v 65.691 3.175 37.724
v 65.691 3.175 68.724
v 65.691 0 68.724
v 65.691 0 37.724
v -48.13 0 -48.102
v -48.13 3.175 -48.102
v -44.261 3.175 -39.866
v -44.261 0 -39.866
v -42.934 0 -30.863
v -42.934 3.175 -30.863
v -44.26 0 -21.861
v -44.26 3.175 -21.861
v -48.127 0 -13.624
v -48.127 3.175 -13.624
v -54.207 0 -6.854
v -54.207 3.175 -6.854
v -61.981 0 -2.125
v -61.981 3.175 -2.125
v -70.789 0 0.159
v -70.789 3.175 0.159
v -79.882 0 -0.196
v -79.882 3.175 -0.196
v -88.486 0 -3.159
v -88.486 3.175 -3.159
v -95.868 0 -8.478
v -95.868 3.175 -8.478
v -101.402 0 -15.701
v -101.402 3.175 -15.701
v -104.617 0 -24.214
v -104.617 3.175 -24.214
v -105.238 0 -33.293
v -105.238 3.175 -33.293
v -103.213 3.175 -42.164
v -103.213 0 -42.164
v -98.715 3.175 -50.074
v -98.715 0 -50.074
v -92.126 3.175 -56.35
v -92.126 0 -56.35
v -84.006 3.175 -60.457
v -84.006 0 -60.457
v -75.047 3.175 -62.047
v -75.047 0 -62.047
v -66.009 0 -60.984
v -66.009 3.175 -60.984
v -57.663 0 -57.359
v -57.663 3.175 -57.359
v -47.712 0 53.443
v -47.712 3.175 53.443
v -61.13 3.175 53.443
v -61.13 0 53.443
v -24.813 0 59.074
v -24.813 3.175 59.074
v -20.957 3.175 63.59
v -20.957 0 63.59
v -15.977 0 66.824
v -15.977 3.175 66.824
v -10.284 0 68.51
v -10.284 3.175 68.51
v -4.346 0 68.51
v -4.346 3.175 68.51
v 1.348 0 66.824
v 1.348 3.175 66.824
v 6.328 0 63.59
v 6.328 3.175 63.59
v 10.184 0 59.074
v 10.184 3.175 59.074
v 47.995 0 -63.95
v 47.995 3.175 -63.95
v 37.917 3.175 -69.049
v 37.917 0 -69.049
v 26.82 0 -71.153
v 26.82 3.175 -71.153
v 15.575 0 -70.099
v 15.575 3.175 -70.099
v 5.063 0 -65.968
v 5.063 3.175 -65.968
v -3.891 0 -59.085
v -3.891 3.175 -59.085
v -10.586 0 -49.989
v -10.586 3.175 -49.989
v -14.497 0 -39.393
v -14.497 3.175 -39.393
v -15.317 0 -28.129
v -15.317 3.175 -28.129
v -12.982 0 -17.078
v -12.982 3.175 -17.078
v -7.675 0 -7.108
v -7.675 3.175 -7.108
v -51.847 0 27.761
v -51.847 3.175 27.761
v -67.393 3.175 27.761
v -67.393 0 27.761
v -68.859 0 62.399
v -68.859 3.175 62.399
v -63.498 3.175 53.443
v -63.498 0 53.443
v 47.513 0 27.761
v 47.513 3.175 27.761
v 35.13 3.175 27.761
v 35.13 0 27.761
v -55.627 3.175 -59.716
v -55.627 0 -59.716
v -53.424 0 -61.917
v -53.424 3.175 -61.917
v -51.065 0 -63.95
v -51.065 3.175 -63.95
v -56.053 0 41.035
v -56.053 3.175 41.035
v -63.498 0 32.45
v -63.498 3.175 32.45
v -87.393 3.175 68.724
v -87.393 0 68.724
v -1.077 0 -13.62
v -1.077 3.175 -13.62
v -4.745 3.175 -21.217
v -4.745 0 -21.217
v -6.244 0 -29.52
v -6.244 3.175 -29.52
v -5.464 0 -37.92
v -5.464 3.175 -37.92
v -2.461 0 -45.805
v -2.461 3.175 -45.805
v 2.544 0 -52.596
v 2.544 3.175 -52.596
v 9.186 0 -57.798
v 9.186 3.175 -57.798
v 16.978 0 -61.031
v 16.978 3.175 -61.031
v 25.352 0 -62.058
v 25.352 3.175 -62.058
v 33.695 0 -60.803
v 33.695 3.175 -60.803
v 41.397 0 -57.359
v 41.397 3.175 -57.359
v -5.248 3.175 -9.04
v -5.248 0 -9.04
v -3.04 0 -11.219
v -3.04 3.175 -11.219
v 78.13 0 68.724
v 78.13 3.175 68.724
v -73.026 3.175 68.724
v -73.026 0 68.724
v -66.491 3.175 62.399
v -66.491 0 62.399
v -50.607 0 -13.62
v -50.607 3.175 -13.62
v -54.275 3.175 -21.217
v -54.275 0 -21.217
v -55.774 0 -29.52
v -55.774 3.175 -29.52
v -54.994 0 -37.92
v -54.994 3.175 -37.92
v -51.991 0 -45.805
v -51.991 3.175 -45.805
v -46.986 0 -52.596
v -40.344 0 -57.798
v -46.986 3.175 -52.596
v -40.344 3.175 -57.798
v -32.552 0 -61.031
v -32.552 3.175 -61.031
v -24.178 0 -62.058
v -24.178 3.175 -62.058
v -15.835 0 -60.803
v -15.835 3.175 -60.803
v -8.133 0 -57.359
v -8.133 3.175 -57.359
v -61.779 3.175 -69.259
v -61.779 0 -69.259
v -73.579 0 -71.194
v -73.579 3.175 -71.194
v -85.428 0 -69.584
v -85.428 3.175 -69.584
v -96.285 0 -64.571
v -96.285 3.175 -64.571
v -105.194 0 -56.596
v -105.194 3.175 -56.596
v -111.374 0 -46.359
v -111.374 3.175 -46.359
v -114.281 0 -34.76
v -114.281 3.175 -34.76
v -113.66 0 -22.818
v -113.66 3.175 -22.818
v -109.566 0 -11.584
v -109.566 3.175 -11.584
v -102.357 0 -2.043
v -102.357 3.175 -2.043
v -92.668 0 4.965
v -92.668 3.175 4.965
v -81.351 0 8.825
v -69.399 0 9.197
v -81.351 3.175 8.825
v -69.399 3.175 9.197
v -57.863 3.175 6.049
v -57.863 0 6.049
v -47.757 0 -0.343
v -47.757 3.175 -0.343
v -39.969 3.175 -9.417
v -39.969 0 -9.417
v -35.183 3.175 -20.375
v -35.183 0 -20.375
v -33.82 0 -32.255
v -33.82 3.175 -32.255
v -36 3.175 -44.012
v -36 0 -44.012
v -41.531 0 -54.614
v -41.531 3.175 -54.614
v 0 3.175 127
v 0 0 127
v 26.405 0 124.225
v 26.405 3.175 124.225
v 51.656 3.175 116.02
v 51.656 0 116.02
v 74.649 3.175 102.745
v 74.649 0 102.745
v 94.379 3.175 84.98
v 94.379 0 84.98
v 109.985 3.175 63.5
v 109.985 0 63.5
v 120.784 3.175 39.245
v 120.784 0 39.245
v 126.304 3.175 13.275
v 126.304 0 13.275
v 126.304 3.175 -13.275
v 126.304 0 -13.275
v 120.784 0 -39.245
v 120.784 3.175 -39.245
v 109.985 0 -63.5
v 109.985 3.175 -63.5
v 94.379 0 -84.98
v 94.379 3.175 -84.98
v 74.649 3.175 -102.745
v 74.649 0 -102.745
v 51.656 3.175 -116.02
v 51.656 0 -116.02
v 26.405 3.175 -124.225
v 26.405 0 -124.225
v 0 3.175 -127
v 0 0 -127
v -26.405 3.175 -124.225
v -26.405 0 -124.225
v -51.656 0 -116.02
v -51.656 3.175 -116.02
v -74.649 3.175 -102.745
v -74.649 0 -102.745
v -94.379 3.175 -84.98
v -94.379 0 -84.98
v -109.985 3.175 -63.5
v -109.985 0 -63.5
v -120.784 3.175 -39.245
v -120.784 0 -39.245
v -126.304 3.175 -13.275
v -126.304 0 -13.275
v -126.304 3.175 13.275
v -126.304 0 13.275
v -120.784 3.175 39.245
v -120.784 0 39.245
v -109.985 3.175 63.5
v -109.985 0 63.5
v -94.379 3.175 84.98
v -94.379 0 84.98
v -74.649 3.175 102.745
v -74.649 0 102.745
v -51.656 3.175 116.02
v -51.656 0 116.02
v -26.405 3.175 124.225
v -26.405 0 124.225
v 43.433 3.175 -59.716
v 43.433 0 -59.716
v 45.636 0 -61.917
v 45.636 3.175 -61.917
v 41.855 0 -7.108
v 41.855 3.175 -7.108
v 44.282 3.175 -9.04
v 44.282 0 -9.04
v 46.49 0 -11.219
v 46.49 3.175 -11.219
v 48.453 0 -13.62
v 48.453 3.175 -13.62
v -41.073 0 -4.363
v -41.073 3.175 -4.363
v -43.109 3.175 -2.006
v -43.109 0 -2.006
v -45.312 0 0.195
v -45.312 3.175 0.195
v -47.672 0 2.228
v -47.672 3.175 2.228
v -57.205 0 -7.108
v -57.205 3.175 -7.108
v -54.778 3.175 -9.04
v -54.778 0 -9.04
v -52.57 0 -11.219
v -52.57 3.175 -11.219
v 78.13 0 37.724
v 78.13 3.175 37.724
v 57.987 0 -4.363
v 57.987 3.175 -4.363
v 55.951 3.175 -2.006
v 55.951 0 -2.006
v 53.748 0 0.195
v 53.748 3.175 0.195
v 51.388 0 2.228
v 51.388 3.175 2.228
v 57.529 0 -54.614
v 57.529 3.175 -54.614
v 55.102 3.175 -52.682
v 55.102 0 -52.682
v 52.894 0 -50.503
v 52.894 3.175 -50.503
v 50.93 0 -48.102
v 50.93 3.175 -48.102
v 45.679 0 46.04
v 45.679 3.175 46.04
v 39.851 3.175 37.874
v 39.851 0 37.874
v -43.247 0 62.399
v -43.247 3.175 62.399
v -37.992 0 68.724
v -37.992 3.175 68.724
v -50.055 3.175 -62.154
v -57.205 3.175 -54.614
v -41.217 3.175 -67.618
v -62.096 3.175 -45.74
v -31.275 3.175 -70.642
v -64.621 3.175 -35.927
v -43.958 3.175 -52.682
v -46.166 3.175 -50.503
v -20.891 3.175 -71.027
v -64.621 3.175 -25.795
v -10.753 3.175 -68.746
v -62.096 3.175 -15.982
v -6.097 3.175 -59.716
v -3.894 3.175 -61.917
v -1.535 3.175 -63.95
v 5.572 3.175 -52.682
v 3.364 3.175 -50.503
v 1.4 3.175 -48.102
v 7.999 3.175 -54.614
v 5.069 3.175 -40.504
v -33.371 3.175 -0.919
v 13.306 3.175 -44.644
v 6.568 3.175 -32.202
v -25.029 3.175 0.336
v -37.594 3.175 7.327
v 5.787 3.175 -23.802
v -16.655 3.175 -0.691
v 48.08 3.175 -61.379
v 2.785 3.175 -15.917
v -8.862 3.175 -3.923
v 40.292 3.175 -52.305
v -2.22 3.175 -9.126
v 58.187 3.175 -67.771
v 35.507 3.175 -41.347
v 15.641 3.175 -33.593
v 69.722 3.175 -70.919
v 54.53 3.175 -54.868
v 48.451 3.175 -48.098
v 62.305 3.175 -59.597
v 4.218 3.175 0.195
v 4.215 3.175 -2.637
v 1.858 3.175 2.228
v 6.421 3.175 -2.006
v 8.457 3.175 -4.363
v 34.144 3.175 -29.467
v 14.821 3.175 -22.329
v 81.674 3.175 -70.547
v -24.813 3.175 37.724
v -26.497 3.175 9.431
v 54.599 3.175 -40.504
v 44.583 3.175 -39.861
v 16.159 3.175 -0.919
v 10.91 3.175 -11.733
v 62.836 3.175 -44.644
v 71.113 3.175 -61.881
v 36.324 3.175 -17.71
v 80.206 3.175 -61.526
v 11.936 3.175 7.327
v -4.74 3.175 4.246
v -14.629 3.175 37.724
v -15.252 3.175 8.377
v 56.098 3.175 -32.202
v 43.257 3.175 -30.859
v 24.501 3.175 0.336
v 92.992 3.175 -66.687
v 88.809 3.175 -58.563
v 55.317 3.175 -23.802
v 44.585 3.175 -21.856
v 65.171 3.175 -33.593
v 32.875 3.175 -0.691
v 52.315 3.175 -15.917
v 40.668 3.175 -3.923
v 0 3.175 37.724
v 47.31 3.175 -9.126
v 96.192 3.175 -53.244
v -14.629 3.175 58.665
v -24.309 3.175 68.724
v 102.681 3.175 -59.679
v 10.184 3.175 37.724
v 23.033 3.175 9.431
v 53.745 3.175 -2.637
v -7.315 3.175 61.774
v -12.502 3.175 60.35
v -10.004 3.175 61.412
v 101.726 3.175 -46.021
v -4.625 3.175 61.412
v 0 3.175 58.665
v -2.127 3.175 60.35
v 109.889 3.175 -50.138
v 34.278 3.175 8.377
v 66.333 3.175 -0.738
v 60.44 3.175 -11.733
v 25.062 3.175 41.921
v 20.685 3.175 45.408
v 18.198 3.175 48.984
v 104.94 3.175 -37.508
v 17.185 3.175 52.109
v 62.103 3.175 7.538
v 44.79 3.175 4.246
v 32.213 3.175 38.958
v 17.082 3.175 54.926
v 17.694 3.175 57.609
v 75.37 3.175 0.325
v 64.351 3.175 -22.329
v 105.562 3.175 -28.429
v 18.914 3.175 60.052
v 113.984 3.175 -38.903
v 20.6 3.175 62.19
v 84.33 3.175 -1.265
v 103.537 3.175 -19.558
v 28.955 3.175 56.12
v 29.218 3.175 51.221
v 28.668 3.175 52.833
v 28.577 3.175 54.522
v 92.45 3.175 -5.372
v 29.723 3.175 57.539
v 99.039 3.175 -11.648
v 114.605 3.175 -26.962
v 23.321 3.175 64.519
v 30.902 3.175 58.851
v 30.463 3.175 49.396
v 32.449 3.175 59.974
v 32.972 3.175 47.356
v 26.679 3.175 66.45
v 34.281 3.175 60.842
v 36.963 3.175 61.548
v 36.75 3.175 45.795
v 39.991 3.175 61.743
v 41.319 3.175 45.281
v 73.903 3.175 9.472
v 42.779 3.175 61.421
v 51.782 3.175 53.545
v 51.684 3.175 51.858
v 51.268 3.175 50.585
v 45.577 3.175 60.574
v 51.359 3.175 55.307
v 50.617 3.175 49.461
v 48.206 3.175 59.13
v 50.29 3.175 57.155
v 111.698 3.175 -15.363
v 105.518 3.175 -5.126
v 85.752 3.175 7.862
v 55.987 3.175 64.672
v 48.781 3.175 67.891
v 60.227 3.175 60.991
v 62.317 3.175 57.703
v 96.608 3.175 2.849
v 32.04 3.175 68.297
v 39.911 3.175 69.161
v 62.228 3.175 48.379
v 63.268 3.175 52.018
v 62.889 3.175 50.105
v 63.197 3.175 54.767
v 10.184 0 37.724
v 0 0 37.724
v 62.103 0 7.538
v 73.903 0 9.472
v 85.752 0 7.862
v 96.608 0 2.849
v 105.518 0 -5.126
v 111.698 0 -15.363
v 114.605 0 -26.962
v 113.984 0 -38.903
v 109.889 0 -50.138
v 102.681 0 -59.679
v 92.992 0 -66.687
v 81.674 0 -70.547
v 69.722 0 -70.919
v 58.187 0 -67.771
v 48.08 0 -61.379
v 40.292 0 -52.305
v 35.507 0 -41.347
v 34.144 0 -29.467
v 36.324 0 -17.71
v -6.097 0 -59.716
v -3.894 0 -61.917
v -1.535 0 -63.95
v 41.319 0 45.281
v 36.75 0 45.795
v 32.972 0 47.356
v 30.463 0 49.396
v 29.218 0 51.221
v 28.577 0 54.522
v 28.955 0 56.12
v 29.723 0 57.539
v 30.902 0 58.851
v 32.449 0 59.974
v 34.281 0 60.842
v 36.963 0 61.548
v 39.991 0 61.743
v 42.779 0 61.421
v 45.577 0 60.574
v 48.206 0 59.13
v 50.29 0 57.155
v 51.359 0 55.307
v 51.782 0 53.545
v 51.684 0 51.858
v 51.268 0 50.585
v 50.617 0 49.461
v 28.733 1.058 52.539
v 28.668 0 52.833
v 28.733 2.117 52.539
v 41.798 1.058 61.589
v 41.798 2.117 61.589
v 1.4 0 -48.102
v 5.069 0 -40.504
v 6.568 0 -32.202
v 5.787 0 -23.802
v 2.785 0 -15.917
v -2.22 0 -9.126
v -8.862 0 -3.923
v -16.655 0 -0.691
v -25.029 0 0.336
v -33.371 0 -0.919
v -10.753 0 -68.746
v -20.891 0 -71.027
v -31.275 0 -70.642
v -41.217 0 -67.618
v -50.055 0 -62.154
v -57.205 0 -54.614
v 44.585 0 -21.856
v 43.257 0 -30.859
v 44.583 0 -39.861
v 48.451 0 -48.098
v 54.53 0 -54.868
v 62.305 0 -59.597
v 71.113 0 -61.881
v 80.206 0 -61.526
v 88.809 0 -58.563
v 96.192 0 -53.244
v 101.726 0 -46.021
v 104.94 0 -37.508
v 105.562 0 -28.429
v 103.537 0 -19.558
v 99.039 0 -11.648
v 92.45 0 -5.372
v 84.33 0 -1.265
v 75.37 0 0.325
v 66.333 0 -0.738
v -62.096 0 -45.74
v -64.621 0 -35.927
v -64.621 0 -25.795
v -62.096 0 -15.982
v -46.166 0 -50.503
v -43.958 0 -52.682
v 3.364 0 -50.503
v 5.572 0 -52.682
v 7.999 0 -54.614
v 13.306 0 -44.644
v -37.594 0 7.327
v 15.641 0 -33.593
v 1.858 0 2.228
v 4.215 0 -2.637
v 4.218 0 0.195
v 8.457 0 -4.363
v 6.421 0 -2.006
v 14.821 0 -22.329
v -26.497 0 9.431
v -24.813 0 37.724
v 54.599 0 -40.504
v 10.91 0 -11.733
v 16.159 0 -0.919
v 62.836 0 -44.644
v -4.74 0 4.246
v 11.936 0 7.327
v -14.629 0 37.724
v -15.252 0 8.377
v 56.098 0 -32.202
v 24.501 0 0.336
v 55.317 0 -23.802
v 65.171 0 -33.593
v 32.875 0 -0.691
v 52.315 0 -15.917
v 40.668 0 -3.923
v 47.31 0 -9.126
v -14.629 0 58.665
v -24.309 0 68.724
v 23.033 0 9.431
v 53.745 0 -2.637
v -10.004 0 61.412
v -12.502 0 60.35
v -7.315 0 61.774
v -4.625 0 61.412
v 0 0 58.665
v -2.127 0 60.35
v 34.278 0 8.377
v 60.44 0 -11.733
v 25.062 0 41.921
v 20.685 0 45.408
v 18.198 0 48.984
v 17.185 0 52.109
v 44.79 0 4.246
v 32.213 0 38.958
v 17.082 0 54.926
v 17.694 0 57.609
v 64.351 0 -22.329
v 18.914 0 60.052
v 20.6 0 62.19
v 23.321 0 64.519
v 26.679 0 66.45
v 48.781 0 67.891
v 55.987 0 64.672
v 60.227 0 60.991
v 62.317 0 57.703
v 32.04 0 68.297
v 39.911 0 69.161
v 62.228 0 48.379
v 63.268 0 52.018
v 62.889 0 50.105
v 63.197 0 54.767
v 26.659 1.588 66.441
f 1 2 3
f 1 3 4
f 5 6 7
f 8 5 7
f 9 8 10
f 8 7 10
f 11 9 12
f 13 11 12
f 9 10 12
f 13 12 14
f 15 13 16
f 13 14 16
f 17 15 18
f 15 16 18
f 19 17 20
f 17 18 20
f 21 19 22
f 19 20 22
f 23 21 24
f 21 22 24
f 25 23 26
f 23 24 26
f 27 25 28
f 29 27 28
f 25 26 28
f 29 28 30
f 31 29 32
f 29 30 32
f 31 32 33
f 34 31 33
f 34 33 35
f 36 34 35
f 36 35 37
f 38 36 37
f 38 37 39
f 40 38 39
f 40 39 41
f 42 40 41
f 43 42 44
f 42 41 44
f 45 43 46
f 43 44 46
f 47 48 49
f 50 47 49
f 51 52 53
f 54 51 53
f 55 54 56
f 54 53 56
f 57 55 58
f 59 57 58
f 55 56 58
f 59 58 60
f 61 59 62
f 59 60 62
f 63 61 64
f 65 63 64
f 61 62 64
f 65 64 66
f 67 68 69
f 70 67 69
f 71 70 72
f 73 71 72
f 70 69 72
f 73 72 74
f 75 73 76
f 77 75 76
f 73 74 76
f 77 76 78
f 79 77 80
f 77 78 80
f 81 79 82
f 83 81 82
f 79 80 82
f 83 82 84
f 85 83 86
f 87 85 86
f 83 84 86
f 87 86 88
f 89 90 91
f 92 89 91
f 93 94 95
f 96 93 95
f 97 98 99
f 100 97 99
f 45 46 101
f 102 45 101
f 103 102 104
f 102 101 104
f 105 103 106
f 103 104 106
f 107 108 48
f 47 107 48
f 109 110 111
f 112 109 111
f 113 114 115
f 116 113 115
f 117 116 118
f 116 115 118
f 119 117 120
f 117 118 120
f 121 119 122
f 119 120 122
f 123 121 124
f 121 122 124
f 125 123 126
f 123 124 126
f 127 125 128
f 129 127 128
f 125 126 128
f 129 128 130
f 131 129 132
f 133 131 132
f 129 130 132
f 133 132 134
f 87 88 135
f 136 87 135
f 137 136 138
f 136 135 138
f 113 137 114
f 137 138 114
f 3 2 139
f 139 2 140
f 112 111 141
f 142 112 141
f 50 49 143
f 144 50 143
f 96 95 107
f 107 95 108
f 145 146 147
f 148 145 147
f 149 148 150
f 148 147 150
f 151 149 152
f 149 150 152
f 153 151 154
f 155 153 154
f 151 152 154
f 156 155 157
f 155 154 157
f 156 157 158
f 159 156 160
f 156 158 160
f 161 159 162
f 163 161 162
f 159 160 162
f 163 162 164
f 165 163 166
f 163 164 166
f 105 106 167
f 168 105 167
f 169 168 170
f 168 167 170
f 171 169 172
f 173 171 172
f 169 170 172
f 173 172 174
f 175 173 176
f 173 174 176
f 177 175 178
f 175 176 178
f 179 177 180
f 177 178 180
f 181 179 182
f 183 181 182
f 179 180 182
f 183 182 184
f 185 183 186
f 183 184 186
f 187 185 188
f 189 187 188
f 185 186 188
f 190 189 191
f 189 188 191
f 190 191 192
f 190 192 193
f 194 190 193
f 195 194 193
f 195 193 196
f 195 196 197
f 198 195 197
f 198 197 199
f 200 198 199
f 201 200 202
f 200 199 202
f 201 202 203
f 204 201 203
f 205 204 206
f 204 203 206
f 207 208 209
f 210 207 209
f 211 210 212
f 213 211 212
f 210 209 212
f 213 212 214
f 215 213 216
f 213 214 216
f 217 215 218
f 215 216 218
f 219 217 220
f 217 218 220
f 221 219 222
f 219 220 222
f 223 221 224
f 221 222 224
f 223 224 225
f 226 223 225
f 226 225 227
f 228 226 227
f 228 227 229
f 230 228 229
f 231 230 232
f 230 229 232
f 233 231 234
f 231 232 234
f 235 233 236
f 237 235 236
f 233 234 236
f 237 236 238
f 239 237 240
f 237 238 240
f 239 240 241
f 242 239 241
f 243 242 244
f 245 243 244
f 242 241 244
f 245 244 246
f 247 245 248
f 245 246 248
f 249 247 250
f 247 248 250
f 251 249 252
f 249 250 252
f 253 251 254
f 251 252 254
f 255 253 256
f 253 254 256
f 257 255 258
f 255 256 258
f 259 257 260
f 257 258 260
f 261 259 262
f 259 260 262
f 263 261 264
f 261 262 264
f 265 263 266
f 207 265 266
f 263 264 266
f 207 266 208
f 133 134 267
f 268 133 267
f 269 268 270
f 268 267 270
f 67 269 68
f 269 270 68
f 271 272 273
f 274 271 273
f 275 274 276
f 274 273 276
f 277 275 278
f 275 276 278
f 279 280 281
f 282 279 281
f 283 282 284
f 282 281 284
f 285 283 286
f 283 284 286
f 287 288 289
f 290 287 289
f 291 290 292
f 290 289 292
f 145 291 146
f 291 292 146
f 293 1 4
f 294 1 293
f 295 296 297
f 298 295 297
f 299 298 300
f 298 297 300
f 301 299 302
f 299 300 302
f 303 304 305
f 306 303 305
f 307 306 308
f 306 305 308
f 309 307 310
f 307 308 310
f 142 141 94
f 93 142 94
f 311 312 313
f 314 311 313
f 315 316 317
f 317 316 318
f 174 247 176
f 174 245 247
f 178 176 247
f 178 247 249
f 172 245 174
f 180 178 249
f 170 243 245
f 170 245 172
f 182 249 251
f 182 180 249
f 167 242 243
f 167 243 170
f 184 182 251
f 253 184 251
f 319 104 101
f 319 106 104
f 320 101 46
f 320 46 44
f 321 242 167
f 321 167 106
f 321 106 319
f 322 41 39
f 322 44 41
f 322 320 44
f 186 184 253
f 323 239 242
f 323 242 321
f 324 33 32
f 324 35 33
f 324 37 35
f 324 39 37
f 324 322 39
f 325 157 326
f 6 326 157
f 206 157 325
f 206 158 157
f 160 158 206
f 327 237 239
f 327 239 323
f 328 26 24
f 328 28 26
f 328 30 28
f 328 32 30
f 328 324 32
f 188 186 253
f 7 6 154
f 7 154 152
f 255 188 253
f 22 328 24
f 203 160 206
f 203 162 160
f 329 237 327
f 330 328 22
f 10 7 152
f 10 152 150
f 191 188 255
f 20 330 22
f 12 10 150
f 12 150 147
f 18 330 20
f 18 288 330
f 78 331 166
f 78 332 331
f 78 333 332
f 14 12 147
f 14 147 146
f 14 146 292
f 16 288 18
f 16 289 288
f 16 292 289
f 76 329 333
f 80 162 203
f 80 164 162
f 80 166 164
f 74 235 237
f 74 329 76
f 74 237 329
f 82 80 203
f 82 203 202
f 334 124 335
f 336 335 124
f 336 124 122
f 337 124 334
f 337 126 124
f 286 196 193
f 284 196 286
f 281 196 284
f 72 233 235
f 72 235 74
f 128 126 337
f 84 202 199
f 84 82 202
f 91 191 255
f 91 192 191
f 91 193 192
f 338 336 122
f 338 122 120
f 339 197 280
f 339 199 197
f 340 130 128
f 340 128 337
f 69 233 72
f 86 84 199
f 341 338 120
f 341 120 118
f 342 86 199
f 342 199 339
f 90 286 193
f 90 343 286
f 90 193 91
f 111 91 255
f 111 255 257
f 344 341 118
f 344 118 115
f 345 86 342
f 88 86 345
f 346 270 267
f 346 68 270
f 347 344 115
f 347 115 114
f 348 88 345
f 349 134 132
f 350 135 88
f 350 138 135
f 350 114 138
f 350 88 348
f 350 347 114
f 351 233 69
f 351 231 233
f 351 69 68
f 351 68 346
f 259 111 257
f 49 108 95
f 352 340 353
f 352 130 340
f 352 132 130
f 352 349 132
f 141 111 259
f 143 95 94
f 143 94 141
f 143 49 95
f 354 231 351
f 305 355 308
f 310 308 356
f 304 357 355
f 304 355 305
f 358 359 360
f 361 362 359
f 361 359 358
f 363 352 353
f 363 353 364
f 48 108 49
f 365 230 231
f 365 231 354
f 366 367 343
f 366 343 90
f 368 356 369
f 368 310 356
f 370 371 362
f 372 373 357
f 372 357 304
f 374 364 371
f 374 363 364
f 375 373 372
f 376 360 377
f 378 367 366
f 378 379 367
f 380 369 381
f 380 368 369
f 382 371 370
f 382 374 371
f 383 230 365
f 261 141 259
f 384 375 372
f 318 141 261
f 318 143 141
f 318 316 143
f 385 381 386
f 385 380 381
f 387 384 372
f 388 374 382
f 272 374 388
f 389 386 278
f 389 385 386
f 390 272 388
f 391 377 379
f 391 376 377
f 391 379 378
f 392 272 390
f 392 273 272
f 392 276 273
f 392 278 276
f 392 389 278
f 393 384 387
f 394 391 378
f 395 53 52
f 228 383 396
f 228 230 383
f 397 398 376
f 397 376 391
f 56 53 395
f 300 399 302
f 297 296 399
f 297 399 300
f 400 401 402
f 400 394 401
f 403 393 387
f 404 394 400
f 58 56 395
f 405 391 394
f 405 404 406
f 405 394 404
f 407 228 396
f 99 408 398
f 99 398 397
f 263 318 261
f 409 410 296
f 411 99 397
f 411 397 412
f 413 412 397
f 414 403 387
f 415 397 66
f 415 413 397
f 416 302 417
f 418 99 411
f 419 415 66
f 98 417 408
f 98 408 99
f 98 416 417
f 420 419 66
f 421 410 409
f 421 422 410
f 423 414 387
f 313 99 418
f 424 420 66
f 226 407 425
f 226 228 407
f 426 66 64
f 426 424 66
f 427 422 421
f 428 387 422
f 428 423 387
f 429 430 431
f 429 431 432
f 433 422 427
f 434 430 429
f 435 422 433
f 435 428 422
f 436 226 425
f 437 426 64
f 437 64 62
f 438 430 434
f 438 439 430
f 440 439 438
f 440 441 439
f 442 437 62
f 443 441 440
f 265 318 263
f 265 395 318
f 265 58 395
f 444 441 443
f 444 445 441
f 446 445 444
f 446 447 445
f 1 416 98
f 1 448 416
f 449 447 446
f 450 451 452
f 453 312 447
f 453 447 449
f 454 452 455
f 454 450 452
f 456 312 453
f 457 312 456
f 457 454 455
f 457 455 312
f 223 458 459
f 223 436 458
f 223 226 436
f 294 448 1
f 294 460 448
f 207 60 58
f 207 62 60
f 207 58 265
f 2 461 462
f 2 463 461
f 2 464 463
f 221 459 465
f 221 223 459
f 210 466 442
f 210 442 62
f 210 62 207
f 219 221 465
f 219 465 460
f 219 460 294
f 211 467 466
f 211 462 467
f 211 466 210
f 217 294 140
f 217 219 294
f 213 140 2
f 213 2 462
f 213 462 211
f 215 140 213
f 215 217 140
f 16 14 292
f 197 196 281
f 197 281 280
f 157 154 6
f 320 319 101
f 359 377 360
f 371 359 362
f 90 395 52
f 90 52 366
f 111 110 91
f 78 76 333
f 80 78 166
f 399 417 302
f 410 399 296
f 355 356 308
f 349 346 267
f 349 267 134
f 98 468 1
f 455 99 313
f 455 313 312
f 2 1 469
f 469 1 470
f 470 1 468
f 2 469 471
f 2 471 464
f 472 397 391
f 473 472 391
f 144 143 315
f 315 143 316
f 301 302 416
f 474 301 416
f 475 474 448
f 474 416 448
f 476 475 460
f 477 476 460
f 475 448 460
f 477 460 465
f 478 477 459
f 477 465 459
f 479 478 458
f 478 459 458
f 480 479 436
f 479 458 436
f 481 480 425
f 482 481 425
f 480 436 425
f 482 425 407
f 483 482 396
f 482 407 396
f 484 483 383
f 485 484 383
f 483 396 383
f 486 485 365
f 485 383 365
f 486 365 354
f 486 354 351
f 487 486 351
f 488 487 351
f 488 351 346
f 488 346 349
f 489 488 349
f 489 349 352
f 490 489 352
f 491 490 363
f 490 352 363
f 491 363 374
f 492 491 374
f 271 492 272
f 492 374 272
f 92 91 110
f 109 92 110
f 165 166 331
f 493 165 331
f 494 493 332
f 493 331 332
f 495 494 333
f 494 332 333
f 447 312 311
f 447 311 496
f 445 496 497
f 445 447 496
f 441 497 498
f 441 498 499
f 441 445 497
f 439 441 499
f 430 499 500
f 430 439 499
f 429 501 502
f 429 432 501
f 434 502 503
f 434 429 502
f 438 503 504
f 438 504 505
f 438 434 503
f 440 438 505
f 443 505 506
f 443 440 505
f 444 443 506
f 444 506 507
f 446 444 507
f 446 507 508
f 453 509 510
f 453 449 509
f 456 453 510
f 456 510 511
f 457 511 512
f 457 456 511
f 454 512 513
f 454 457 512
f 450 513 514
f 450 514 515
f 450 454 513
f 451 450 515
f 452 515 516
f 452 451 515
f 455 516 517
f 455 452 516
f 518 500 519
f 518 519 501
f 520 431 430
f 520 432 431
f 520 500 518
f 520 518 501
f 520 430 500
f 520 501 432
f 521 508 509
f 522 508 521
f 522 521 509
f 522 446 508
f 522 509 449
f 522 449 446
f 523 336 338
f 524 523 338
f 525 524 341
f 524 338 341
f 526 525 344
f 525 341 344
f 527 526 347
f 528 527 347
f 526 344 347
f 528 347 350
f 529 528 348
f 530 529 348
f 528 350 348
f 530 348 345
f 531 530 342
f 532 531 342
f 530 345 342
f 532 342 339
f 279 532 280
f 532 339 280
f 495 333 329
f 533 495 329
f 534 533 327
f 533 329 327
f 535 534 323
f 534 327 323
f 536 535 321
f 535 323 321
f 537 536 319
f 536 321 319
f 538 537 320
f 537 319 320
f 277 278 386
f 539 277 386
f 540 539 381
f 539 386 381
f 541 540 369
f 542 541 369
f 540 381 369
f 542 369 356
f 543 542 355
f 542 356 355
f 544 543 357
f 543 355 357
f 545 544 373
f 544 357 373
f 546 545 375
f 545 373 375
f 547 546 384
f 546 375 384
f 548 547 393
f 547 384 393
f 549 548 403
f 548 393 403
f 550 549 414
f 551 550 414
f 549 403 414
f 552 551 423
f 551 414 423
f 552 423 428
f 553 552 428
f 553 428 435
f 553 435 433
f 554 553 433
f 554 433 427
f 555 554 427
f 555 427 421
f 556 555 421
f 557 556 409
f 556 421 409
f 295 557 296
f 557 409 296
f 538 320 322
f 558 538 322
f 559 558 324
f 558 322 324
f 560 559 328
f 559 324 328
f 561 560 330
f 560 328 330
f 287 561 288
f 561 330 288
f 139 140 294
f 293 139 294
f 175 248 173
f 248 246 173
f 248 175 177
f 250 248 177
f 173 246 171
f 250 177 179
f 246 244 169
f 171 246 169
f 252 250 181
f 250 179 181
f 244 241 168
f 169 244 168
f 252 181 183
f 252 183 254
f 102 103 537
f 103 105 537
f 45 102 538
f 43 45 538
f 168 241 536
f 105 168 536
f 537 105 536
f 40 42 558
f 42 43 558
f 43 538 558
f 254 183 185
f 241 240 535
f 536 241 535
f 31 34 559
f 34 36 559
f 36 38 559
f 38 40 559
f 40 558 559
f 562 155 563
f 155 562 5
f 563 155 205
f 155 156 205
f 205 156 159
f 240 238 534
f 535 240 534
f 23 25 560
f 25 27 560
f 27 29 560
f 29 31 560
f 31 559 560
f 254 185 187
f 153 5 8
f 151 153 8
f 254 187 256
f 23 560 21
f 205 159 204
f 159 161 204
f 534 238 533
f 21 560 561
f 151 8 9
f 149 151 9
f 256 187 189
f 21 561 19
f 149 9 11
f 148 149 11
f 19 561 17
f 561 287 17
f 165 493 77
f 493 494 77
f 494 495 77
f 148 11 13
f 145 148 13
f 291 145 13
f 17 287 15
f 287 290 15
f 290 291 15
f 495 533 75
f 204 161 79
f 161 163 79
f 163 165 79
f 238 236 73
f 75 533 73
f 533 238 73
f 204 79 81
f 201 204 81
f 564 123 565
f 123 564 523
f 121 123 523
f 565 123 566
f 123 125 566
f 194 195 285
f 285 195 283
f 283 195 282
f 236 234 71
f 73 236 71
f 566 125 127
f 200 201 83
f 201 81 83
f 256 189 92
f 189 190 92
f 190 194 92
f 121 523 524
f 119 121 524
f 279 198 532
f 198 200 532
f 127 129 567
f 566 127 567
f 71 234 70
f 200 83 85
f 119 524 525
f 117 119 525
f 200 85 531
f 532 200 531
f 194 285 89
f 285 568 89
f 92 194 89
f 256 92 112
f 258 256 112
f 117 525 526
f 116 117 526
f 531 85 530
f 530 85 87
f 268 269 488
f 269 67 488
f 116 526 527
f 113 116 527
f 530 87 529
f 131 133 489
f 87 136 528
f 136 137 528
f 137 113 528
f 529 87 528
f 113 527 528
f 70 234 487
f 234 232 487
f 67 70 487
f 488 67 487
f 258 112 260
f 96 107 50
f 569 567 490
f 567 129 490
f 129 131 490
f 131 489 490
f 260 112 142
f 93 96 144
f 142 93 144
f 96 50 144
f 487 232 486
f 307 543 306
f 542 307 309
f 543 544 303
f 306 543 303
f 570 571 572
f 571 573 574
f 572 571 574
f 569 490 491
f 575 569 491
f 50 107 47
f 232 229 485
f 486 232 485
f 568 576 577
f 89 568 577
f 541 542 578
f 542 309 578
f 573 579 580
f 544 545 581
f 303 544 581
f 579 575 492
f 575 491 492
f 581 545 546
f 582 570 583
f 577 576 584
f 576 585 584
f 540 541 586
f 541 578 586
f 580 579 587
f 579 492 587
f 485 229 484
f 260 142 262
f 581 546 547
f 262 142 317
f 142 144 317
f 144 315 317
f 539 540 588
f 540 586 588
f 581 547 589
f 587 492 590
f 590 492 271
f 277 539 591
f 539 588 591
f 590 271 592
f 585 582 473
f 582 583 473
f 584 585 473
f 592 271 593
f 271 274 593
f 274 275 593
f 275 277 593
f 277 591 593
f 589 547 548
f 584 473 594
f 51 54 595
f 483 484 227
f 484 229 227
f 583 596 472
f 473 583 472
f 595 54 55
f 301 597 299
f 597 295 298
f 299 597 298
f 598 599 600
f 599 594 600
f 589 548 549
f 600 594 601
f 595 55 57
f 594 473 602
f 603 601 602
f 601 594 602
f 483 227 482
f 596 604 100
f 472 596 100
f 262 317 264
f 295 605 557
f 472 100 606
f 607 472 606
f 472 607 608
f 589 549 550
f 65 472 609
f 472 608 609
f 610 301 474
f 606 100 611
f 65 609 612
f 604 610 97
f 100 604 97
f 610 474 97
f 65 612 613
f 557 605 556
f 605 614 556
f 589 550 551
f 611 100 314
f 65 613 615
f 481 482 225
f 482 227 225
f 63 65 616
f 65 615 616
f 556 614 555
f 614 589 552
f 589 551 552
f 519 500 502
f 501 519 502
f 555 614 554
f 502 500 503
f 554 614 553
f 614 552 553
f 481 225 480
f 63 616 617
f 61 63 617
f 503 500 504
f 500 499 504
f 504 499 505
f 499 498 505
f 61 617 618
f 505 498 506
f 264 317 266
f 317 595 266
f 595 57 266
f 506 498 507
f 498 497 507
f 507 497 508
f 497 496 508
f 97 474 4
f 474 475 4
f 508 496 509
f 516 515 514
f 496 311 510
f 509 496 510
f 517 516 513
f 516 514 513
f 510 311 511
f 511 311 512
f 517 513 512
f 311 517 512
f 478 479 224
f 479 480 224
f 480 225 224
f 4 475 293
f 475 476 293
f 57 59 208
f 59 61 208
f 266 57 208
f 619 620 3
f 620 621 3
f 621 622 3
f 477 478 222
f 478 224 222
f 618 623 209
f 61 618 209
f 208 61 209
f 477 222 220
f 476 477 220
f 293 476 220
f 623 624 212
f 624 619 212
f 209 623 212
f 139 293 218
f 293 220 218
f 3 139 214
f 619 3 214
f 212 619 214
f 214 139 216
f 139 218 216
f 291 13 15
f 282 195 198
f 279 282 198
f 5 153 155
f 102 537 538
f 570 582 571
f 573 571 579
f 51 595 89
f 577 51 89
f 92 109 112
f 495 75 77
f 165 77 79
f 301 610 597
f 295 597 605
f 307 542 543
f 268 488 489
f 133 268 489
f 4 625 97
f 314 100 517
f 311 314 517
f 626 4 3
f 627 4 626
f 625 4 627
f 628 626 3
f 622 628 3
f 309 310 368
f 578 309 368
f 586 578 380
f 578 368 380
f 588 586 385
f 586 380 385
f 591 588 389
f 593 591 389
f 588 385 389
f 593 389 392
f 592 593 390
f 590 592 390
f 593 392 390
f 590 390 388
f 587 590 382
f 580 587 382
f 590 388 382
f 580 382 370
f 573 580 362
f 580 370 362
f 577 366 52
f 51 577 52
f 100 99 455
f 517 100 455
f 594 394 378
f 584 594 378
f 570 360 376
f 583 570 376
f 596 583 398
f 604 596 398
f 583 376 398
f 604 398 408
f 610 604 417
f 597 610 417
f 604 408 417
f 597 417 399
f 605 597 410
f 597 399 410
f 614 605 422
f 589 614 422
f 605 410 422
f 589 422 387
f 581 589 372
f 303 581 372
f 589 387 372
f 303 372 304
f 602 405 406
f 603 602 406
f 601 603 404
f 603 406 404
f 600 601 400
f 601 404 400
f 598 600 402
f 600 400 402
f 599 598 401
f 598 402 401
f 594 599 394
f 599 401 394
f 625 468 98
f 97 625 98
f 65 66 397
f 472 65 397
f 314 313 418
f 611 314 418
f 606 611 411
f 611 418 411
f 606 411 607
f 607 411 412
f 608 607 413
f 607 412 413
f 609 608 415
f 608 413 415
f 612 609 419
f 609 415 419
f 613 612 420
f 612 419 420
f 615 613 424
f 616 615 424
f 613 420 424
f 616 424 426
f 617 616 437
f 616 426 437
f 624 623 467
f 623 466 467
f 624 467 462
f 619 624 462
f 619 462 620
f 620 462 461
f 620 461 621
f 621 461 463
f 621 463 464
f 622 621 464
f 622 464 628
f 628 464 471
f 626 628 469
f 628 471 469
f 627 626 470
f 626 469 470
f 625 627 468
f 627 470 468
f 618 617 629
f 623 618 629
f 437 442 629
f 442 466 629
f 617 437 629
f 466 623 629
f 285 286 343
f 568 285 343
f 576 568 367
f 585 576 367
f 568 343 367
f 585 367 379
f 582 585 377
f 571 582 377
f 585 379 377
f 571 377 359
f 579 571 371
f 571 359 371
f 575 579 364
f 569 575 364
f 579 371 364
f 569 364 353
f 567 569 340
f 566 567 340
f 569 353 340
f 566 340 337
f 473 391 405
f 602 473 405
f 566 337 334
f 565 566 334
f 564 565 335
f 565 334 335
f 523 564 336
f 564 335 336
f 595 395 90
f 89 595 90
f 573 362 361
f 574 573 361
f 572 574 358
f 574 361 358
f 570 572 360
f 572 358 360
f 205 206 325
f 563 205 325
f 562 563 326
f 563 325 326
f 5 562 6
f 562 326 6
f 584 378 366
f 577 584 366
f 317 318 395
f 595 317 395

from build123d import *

# Parameters (mm, degrees)
SKETCH1_R           = 127
BOSS_EXTRUDE1_DEPTH = 3.175
SKETCH2_W           = 12.438745875
SKETCH2_H           = 31.000011437
CUT_EXTRUDE1_DEPTH  = 3.175


with BuildPart() as part:
    # Sketch1 → Boss-Extrude1 (new body)
    with BuildSketch(Plane(origin=(0, 0, 0), x_dir=(1, 0, 0), z_dir=(0, 1, 0))):
        with Locations(Location((0, 0, 0), (0, 0, 270))):
            Circle(SKETCH1_R)
    extrude(amount=BOSS_EXTRUDE1_DEPTH)

    # Sketch2 → Cut-Extrude1 (cut)
    with BuildSketch(Plane(origin=(0, 3.175, 0), x_dir=(1, 0, 0), z_dir=(0, 1, 0))):
        Polygon((-51.846570392, -27.761273072), (-67.392708125, -27.761273072), (-63.49777994, -32.449612553), (-87.392519872, -68.724363756), (-73.025563352, -68.724363756), (-68.858940519, -62.398988085), (-63.49777994, -53.443146367), (-56.052860633, -41.035320282), (-47.711513929, -53.443146367), (-61.129520895, -53.443146367), (-66.490681474, -62.398988085), (-43.246780748, -62.398988085), (-37.991853267, -68.724363756), (-24.308519881, -68.724363756), align=None)
        with BuildLine():
            Line((47.513174781, -27.761273072), (35.129585086, -27.761273072))
            Line((35.129585086, -27.761273072), (50.616895331, -49.460734396))
            add(Edge.make_bspline(
                [(45.679130911, -46.040196269), (31.550212316, -41.255173944), (28.733398827, -52.539450499), (25.916585337, -63.823727055), (41.797676766, -61.589469293), (57.678768195, -59.355211531), (50.616895331, -49.460734396)],
                knots=[1.020082476, 1.020082476, 1.020082476, 2.907145281, 2.907145281, 4.794208086, 4.794208086, 6.681270891, 6.681270891, 6.681270891], degree=2, weights=[1, 0.586932541, 1, 0.586932541, 1, 0.586932541, 1]))
            Line((45.679130911, -46.040196269), (39.850903677, -37.874195236))
            add(Edge.make_bspline(
                [(39.850903677, -37.874195236), (-30.231497677, -39.73502536), (26.658902193, -66.440769536), (83.549302064, -93.146513713), (62.228166445, -48.37862931)],
                knots=[1.563851242, 1.563851242, 1.563851242, 4.067513609, 4.067513609, 6.571175976, 6.571175976, 6.571175976], degree=2, weights=[1, 0.31358407, 1, 0.31358407, 1]))
            Line((62.228166445, -48.37862931), (47.513174781, -27.761273072))
        make_face()
        with BuildLine():
            Line((-14.629199742, -37.724352319), (-24.813373872, -37.724352319))
            Line((-24.813373872, -37.724352319), (-24.813373872, -59.074478125))
            ThreePointArc((-24.813373872, -59.074478125), (-7.314599871, -68.724363756), (10.184174129, -59.074478125))
            Line((10.184174129, -59.074478125), (10.184174129, -37.724352319))
            Line((10.184174129, -37.724352319), (0, -37.724352319))
            Line((0, -37.724352319), (0, -58.665309043))
            ThreePointArc((0, -58.665309043), (-7.314599871, -61.774148851), (-14.629199742, -58.665309043))
            Line((-14.629199742, -58.665309043), (-14.629199742, -37.724352319))
        make_face()
        with Locations((71.910421643, -53.224358038)):
            Rectangle(SKETCH2_W, SKETCH2_H)
        with BuildLine():
            ThreePointArc((-57.663269864, 57.359209553), (-54.545921341, 60.836930705), (-51.064741507, 63.950416403))
            ThreePointArc((-51.064741507, 63.950416403), (-102.357132874, 2.042968688), (-41.531381183, 54.613582399))
            ThreePointArc((-41.531381183, 54.613582399), (-45.091015331, 51.621496868), (-48.12990954, 48.101739338))
            ThreePointArc((-48.12990954, 48.101739338), (-95.868420767, 8.4780016), (-57.663269864, 57.359209553))
        make_face()
        with BuildLine():
            ThreePointArc((-50.606514106, 13.62018236), (-46.986171072, 52.596169792), (-8.133269864, 57.359209553))
            ThreePointArc((-8.133269864, 57.359209553), (-5.015921341, 60.836930705), (-1.534741507, 63.950416403))
            ThreePointArc((-1.534741507, 63.950416403), (-31.275194817, 70.642250855), (-57.205042464, 54.613582399))
            ThreePointArc((-57.205042464, 54.613582399), (-64.940122856, 30.860960849), (-57.205042464, 7.108339298))
            ThreePointArc((-57.205042464, 7.108339298), (-53.645408316, 10.100424829), (-50.606514106, 13.62018236))
        make_face()
        with BuildLine():
            ThreePointArc((-1.076514106, 13.62018236), (2.543828928, 52.596169792), (41.396730136, 57.359209553))
            ThreePointArc((41.396730136, 57.359209553), (44.514078659, 60.836930705), (47.995258493, 63.950416403))
            ThreePointArc((47.995258493, 63.950416403), (-3.891203984, 59.084881899), (-7.675042464, 7.108339298))
            ThreePointArc((-7.675042464, 7.108339298), (-4.115408316, 10.100424829), (-1.076514106, 13.62018236))
        make_face()
        with BuildLine():
            ThreePointArc((48.453485894, 13.62018236), (96.19199712, 53.243920097), (57.986846218, 4.362712144))
            ThreePointArc((57.986846218, 4.362712144), (54.869497694, 0.884990992), (51.38831786, -2.228494706))
            ThreePointArc((51.38831786, -2.228494706), (102.680709227, 59.678953009), (41.854957536, 7.108339298))
            ThreePointArc((41.854957536, 7.108339298), (45.414591684, 10.100424829), (48.453485894, 13.62018236))
        make_face()
        with BuildLine():
            ThreePointArc((1.40009046, 48.101739338), (-2.220252575, 9.125751905), (-41.073153782, 4.362712144))
            ThreePointArc((-41.073153782, 4.362712144), (-44.190502306, 0.884990992), (-47.67168214, -2.228494706))
            ThreePointArc((-47.67168214, -2.228494706), (4.214780337, 2.637039798), (7.998618817, 54.613582399))
            ThreePointArc((7.998618817, 54.613582399), (4.438984669, 51.621496868), (1.40009046, 48.101739338))
        make_face()
        with BuildLine():
            ThreePointArc((50.93009046, 48.101739338), (47.309747425, 9.125751905), (8.456846218, 4.362712144))
            ThreePointArc((8.456846218, 4.362712144), (5.339497694, 0.884990992), (1.85831786, -2.228494706))
            ThreePointArc((1.85831786, -2.228494706), (53.744780337, 2.637039798), (57.528618817, 54.613582399))
            ThreePointArc((57.528618817, 54.613582399), (53.968984669, 51.621496868), (50.93009046, 48.101739338))
        make_face()
    extrude(amount=-CUT_EXTRUDE1_DEPTH, mode=Mode.SUBTRACT)


solid = part.part
